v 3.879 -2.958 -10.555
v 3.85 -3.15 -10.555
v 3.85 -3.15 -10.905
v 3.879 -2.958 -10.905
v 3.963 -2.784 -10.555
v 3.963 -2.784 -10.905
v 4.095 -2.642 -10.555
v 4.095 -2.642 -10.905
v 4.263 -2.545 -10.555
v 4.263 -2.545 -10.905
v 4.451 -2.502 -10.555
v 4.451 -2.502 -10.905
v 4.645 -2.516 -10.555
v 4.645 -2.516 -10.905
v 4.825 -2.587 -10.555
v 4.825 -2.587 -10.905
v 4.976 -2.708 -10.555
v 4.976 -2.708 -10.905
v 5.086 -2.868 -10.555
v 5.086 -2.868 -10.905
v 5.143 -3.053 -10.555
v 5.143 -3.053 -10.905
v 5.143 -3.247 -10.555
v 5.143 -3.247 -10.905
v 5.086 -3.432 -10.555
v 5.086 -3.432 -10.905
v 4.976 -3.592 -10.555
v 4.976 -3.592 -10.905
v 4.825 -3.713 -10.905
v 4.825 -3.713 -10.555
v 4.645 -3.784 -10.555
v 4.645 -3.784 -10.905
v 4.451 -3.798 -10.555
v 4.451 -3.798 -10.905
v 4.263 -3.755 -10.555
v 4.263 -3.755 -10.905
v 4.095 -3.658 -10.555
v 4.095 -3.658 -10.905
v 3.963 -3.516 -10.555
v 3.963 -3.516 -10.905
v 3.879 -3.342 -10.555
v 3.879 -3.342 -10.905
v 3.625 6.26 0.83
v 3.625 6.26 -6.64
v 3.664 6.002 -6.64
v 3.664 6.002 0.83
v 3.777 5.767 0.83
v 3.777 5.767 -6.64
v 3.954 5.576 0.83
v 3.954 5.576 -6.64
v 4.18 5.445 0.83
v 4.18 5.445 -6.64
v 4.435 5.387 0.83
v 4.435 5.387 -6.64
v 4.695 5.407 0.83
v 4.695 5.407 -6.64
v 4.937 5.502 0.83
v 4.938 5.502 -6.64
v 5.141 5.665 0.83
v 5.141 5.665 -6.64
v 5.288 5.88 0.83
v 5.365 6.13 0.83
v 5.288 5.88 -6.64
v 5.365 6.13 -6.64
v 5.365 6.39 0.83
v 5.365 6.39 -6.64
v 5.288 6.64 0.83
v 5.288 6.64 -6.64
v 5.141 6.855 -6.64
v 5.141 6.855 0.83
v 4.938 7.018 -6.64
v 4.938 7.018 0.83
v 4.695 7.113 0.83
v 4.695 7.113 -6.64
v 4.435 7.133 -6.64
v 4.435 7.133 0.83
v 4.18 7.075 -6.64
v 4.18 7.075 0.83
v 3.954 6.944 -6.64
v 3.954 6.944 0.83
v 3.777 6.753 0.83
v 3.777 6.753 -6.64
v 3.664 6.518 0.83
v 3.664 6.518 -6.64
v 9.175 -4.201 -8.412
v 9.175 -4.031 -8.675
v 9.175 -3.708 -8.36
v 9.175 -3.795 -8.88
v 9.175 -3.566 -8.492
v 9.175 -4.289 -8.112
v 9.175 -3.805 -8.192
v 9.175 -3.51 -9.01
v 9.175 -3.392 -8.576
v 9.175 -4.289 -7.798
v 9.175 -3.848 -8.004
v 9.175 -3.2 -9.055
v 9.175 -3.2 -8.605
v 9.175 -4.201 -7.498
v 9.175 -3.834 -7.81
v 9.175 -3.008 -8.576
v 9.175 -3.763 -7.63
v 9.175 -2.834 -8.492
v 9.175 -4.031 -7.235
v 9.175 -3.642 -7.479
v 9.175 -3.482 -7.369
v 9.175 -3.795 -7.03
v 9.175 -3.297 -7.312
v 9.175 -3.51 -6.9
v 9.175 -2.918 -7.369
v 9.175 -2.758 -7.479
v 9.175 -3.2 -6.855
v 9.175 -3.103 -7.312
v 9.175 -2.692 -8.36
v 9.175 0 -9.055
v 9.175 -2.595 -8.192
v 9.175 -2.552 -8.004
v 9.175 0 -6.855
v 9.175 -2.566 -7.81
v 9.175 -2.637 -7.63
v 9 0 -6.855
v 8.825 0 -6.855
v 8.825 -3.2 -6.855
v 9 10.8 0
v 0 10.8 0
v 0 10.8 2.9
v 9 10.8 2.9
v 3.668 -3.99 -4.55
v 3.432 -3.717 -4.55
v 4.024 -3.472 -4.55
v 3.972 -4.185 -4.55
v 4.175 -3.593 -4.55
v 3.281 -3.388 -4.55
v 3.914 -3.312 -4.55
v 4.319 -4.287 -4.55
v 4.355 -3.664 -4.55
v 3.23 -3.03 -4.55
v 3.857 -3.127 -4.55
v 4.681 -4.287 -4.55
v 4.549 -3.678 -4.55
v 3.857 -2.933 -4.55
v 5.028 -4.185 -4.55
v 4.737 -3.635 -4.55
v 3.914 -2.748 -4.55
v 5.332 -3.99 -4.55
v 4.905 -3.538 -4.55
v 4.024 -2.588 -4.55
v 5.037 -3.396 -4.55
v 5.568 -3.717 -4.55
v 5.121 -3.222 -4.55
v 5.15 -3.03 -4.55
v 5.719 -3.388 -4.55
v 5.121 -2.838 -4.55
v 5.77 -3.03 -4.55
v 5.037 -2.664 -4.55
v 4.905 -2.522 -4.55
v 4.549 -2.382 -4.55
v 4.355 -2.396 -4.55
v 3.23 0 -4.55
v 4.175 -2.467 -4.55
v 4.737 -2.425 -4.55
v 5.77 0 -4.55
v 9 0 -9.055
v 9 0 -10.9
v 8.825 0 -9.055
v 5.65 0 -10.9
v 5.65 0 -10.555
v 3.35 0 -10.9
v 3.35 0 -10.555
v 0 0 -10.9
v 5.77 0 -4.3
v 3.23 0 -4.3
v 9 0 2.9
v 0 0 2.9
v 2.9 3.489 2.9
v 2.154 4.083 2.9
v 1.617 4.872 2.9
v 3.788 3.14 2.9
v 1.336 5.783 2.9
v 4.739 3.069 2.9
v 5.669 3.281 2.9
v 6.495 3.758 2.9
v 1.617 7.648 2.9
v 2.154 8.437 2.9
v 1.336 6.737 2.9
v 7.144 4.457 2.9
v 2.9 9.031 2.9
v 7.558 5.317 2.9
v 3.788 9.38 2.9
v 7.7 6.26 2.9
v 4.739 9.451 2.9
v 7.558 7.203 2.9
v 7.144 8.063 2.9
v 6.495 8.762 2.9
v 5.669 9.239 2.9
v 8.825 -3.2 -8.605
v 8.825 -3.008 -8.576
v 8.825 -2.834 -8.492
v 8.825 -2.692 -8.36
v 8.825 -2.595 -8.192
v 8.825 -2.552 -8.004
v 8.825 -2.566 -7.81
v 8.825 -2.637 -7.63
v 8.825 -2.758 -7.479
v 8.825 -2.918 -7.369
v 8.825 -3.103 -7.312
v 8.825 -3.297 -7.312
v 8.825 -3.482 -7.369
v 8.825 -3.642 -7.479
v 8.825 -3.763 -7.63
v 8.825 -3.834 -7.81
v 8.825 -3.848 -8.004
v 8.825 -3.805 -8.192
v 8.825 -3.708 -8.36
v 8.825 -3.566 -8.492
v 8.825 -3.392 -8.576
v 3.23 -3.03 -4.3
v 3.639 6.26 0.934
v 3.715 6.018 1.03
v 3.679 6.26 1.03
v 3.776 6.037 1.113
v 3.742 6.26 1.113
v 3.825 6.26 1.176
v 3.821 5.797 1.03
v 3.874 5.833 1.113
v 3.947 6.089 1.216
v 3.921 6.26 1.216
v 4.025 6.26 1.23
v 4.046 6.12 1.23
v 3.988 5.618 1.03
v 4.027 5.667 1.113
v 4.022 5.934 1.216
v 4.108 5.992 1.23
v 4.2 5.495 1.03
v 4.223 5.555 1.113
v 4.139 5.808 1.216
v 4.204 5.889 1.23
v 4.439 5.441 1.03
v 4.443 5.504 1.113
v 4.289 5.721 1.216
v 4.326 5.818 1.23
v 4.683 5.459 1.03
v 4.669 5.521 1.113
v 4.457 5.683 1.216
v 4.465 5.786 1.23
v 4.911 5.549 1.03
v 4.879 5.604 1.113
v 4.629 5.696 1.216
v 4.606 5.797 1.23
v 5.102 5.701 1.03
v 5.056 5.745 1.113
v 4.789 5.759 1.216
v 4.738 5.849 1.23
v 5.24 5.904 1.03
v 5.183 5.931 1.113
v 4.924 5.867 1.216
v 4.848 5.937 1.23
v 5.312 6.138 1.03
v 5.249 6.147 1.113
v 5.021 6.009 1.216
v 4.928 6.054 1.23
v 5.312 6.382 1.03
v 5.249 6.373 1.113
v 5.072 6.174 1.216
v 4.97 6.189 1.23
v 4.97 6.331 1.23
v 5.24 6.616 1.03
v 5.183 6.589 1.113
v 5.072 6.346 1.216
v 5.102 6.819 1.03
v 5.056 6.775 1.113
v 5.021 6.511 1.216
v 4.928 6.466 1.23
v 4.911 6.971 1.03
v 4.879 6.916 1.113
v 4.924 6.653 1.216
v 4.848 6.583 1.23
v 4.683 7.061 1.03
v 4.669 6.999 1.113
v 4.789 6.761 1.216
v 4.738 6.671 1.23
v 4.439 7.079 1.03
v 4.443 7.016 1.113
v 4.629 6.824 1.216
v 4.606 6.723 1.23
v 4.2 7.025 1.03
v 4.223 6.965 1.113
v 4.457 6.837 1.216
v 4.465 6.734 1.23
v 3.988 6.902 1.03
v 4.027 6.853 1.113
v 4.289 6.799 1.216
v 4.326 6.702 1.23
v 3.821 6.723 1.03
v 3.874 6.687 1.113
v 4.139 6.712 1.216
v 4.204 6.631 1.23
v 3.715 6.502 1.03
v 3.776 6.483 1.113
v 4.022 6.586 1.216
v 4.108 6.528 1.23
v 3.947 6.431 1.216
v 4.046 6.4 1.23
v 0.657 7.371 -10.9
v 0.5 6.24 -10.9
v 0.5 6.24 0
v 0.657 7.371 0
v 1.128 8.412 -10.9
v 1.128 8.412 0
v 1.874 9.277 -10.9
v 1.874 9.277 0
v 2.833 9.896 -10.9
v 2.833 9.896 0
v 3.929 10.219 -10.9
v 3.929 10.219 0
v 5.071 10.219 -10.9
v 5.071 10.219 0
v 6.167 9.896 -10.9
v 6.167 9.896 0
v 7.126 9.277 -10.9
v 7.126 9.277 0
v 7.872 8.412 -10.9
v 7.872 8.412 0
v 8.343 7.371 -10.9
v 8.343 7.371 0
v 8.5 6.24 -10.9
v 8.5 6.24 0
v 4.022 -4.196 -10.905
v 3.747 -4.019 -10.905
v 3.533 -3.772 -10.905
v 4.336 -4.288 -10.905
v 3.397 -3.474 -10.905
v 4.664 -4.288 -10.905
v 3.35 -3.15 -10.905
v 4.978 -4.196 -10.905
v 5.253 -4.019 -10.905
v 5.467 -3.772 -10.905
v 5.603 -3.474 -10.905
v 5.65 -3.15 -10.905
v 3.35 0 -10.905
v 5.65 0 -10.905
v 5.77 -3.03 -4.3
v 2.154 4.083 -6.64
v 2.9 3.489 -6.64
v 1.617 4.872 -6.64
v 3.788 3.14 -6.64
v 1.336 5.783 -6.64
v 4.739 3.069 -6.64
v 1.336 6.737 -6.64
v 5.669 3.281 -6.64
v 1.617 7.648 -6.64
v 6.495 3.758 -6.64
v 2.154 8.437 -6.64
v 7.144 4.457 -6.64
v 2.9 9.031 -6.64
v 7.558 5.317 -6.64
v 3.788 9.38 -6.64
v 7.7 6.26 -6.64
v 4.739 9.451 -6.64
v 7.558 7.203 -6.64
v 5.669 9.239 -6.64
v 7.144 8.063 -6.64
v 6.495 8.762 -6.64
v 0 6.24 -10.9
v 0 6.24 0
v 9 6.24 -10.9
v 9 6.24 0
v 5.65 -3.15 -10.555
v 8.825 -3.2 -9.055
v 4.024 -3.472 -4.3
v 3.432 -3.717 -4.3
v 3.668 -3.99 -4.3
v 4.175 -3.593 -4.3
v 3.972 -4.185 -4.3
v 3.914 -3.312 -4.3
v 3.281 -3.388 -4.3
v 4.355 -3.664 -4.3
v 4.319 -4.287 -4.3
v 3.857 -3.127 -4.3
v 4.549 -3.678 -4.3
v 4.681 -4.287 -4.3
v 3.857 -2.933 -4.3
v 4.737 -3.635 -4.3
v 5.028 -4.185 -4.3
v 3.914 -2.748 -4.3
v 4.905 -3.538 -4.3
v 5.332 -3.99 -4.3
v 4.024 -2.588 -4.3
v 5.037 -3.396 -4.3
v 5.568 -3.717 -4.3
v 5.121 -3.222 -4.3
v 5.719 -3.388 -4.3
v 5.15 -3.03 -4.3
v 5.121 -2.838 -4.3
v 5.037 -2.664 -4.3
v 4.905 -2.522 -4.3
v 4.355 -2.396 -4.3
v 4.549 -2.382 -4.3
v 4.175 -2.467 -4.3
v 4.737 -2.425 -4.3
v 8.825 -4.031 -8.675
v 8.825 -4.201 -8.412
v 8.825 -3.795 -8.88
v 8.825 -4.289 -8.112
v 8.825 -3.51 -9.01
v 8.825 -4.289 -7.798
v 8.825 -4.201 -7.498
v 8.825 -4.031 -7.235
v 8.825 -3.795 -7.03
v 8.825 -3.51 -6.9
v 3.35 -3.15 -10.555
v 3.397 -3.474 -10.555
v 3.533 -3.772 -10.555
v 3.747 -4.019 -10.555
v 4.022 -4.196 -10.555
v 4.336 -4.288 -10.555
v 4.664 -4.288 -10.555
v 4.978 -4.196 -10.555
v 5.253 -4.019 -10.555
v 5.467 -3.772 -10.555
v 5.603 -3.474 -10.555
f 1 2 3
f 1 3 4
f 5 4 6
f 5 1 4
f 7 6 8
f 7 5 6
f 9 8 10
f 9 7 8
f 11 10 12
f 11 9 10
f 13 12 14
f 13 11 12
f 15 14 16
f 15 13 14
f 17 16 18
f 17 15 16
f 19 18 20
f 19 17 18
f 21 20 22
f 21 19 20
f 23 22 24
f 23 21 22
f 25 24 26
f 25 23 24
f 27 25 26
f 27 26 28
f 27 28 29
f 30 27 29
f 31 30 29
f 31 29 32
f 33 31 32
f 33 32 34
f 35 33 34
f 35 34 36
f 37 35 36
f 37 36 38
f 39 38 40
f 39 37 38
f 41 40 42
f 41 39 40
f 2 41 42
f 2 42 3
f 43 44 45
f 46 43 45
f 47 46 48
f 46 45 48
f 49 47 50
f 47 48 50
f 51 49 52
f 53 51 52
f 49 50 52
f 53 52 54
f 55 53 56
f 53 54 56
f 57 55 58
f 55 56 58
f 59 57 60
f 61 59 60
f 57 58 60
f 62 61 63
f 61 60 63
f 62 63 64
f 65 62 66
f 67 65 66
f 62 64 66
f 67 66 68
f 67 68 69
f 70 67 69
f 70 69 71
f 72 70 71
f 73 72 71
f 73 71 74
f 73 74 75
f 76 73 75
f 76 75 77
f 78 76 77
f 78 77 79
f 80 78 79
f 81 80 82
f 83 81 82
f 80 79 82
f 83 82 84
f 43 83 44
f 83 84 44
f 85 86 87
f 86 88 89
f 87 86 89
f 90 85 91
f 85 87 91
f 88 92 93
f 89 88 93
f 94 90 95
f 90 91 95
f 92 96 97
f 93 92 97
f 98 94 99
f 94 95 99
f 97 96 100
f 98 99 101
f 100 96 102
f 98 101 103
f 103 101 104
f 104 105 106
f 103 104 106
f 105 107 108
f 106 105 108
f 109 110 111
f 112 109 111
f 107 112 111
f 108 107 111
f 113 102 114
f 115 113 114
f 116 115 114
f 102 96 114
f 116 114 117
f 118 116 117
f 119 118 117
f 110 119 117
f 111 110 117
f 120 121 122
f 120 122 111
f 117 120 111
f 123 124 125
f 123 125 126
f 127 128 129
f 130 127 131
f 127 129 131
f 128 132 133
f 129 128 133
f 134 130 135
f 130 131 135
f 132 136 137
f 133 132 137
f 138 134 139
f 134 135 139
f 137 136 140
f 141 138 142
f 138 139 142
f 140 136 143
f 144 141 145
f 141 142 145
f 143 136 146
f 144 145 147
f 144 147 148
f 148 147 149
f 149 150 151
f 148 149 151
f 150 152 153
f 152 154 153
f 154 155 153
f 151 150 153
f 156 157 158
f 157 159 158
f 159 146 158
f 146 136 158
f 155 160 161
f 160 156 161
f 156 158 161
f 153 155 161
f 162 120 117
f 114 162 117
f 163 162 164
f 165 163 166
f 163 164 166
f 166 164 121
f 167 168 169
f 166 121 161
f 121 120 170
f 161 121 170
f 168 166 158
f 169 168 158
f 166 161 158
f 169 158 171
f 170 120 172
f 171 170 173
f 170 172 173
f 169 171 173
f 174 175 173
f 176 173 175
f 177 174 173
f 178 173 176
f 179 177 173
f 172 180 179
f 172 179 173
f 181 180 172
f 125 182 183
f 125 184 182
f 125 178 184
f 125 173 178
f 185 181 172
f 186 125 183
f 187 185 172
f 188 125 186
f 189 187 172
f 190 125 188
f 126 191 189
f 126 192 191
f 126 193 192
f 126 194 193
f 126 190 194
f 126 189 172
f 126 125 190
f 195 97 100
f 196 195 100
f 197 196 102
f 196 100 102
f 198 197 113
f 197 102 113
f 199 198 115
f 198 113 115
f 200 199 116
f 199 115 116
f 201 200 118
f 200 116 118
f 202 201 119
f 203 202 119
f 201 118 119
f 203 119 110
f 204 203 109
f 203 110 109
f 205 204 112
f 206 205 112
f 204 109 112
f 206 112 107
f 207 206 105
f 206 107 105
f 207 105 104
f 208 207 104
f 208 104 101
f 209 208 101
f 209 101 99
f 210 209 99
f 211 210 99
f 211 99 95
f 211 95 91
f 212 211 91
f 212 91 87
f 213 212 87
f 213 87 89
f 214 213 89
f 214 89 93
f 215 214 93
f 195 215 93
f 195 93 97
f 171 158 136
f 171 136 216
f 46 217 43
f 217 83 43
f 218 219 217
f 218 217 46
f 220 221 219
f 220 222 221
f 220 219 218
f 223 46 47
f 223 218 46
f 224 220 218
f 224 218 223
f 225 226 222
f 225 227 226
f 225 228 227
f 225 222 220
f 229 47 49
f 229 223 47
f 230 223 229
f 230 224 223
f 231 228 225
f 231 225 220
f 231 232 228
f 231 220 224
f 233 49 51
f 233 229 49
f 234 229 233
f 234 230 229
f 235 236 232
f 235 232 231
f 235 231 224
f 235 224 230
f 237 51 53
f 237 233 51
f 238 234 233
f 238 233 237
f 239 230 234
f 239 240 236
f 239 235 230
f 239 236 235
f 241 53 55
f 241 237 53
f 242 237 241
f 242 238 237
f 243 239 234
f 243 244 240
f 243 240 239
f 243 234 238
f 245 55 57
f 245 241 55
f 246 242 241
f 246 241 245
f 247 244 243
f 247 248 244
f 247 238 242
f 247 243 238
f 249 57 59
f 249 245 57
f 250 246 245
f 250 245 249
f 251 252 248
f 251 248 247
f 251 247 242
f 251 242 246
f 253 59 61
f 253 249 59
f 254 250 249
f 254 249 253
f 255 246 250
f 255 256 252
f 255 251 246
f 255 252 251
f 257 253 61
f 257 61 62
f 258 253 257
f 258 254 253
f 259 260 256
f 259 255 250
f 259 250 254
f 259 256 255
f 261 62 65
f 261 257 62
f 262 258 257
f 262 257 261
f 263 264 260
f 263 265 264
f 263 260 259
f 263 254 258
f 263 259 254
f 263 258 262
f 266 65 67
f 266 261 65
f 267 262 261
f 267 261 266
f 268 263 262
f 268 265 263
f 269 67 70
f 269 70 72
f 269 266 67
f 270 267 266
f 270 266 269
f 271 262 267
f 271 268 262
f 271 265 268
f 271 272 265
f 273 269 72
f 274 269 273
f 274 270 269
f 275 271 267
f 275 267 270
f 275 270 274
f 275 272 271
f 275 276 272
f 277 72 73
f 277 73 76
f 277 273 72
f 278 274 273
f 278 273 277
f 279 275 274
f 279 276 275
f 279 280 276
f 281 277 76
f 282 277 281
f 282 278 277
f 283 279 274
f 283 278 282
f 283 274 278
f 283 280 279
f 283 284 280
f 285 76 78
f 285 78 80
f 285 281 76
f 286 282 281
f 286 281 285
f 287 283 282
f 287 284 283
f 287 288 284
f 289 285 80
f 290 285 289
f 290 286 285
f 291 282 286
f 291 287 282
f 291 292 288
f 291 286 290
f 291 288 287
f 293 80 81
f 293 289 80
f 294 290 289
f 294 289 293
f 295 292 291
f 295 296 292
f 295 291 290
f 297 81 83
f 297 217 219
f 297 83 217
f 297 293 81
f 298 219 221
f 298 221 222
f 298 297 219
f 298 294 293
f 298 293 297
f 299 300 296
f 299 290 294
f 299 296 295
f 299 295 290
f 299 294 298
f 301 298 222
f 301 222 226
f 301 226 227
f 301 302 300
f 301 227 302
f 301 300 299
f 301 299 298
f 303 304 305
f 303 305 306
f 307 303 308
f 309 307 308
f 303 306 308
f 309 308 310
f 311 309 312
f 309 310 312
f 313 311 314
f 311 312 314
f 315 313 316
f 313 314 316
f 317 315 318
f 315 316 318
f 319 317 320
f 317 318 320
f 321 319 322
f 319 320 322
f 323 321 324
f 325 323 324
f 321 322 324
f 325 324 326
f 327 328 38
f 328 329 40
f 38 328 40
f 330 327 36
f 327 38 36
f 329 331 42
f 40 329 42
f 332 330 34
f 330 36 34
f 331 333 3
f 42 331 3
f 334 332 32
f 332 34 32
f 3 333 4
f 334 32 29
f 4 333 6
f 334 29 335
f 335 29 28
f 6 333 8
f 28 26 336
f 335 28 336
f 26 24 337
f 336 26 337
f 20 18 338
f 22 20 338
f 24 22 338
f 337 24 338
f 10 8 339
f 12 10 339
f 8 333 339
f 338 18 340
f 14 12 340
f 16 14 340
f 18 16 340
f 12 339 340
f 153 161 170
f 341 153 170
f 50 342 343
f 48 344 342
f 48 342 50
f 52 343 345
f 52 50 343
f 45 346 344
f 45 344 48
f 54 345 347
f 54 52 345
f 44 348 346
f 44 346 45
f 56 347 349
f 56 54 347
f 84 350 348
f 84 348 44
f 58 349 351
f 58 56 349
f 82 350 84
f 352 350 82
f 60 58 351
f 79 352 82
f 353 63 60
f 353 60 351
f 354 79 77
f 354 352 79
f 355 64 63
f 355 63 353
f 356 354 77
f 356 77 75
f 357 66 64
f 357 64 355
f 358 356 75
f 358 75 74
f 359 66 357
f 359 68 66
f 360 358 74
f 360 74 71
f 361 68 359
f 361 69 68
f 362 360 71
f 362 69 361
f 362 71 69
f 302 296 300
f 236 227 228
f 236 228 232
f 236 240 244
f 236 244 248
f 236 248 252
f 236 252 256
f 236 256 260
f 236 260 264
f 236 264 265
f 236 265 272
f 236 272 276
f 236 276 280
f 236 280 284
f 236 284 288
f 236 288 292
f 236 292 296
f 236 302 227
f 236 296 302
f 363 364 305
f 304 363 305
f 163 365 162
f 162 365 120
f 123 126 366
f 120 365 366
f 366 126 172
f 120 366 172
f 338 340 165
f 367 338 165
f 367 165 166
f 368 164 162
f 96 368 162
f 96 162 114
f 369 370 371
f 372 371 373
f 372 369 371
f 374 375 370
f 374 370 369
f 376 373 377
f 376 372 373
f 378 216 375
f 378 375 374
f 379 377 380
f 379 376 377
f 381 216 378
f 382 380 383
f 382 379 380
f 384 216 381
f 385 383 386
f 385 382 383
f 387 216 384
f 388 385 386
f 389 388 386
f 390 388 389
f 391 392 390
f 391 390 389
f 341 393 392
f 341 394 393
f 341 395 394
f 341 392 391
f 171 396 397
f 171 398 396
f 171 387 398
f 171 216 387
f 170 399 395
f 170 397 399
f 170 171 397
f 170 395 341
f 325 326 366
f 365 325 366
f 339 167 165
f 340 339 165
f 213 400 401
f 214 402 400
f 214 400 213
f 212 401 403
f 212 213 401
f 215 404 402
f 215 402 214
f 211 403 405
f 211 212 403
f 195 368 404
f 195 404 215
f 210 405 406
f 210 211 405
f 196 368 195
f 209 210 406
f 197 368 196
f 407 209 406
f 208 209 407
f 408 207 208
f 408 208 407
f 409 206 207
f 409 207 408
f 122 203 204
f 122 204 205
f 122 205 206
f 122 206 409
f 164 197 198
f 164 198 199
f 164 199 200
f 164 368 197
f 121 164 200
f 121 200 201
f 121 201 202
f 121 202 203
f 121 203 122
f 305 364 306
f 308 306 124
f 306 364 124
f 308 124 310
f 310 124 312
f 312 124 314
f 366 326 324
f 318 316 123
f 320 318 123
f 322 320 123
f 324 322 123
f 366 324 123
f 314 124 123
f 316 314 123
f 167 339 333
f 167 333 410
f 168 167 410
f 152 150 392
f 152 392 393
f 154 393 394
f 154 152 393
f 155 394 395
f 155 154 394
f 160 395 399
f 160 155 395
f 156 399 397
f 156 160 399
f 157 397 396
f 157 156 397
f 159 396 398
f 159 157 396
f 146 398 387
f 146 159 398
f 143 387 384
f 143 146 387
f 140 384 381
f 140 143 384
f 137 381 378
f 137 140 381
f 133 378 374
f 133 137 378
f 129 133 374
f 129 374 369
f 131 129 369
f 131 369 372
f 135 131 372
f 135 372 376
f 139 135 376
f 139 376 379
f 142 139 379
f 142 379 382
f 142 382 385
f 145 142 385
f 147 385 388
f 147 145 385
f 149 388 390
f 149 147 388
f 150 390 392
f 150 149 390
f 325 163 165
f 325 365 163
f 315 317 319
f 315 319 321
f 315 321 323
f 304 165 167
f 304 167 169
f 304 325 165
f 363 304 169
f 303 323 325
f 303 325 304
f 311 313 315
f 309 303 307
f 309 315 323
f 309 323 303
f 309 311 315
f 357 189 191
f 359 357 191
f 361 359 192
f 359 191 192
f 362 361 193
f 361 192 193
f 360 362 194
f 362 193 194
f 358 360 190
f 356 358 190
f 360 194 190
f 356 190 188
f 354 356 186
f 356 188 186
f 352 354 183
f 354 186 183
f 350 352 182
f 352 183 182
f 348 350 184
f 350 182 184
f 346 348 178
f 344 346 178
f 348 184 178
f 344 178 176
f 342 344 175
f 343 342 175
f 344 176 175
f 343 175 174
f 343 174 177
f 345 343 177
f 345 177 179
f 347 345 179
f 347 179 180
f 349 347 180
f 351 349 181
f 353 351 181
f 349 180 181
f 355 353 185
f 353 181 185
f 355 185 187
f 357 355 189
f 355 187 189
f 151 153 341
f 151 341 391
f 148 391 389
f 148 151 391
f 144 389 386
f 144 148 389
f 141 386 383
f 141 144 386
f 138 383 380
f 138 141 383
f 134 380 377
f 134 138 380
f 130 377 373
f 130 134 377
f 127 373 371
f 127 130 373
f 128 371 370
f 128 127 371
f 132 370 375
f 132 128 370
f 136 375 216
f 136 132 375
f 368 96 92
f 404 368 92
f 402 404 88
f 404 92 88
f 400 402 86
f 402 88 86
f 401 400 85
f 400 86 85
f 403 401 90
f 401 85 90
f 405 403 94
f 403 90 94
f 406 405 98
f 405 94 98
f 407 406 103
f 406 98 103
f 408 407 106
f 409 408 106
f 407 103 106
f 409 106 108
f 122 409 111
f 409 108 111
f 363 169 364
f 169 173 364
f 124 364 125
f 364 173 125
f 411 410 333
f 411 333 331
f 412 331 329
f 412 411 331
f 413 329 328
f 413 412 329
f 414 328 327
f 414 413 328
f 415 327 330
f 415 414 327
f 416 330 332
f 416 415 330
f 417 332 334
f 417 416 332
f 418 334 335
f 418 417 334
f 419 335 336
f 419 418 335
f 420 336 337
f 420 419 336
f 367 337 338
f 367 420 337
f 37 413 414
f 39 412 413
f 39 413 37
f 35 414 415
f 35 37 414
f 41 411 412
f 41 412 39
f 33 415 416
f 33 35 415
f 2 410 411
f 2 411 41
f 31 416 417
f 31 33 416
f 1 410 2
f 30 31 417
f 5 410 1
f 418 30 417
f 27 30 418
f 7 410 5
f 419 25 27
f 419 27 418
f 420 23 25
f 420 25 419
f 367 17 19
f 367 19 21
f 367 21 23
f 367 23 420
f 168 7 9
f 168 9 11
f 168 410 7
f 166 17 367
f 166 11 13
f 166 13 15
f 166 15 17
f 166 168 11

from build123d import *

# Parameters (mm, degrees)
SKETCH1_W           = 9
SKETCH1_H           = 10.8
BOSS_EXTRUDE1_DEPTH = 2.9
BOSS_EXTRUDE2_DEPTH = 10.9
SKETCH3_R           = 3.2
CUT_EXTRUDE1_DEPTH  = 9.54
SKETCH4_R           = 0.875
BOSS_EXTRUDE3_DEPTH = 7.87
FILLET1_R           = 0.4
SKETCH5_W           = 2.54
SKETCH5_H           = 0.25
SKETCH5_W_2         = 2.3
SKETCH5_H_2         = 0.35
SKETCH5_W_3         = 0.35
SKETCH5_H_3         = 2.2
BOSS_EXTRUDE4_DEPTH = 4.3
CUT_EXTRUDE2_START  = -0.25
SKETCH6_R           = 0.65
CUT_EXTRUDE2_DEPTH  = 0.25
SKETCH7_R           = 0.65
CUT_EXTRUDE3_DEPTH  = 18.881265336
CUT_EXTRUDE5_START  = -0.35
SKETCH9_R           = 0.65
CUT_EXTRUDE5_DEPTH  = 0.35


with BuildPart() as part:
    # Sketch1 → Boss-Extrude1 (new body)
    with BuildSketch(Plane.XY):
        with Locations((4.5, 5.4)):
            Rectangle(SKETCH1_W, SKETCH1_H)
    extrude(amount=BOSS_EXTRUDE1_DEPTH)

    # Sketch2 → Boss-Extrude2 (add)
    with BuildSketch(Plane(origin=(0, 0, 0), x_dir=(-1, 0, 0), z_dir=(0, 0, -1))):
        with BuildLine():
            Line((-9, 0), (0, 0))
            Line((0, 0), (0, 6.24))
            Line((0, 6.24), (-0.50005, 6.24))
            ThreePointArc((-0.50005, 6.24), (-4.5, 10.26), (-8.49995, 6.24))
            Line((-8.49995, 6.24), (-9, 6.24))
            Line((-9, 6.24), (-9, 0))
        make_face()
    extrude(amount=BOSS_EXTRUDE2_DEPTH)

    # Sketch3 → Cut-Extrude1 (cut)
    with BuildSketch(Plane.XY.offset(2.9)):
        with Locations((4.5, 6.26)):
            Circle(SKETCH3_R)
    extrude(amount=-CUT_EXTRUDE1_DEPTH, mode=Mode.SUBTRACT)

    # Sketch4 → Boss-Extrude3 (add)
    with BuildSketch(Plane.XY.offset(-6.64)):
        with Locations(Location((4.5, 6.26, 0), (0, 0, 180))):
            Circle(SKETCH4_R)
    extrude(amount=BOSS_EXTRUDE3_DEPTH)

    # Fillet1
    fillet1_edges = [part.edges().sort_by_distance(p)[0] for p in [
        (5.375, 6.26, 1.23),
    ]]
    fillet(fillet1_edges, radius=FILLET1_R)

    # Sketch5 → Boss-Extrude4 (add)
    with BuildSketch(Plane.XZ):
        with Locations((4.5, -4.425)):
            Rectangle(SKETCH5_W, SKETCH5_H)
        with Locations((4.5, -10.73)):
            Rectangle(SKETCH5_W_2, SKETCH5_H_2)
        with Locations((9, -7.955)):
            Rectangle(SKETCH5_W_3, SKETCH5_H_3)
    extrude(amount=BOSS_EXTRUDE4_DEPTH)

    # Sketch6 → Cut-Extrude2 (cut)
    with BuildSketch(Plane.XY.offset(-4.3).offset(CUT_EXTRUDE2_START)):
        with Locations((4.5, -3.03)):
            Circle(SKETCH6_R)
        with BuildLine():
            Line((3.23, -3.03), (2.98145415, -3.03))
            Line((2.98145415, -3.03), (2.98145415, -4.481636856))
            Line((2.98145415, -4.481636856), (5.931605951, -4.481636856))
            Line((5.931605951, -4.481636856), (5.931605951, -3.03))
            Line((5.931605951, -3.03), (5.77, -3.03))
            ThreePointArc((5.77, -3.03), (4.5, -4.3), (3.23, -3.03))
        make_face()
    extrude(amount=CUT_EXTRUDE2_DEPTH, mode=Mode.SUBTRACT)

    # Sketch7 → Cut-Extrude3 (cut, through all)
    with BuildSketch(Plane(origin=(9.175, 0, 0), x_dir=(0, 0, -1), z_dir=(1, 0, 0))):
        with Locations((7.955, -3.2)):
            Circle(SKETCH7_R)
        with BuildLine():
            Line((6.855, -3.2), (6.537099377, -3.2))
            Line((6.537099377, -3.2), (6.537099377, -4.556833282))
            Line((6.537099377, -4.556833282), (9.415825045, -4.556833282))
            Line((9.415825045, -4.556833282), (9.415825045, -3.2))
            Line((9.415825045, -3.2), (9.055, -3.2))
            ThreePointArc((9.055, -3.2), (7.955, -4.3), (6.855, -3.2))
        make_face()
    extrude(amount=-CUT_EXTRUDE3_DEPTH, mode=Mode.SUBTRACT)

    # Sketch9 → Cut-Extrude5 (cut)
    with BuildSketch(Plane(origin=(0, 0, -10.905), x_dir=(-1, 0, 0), z_dir=(0, 0, -1)).offset(CUT_EXTRUDE5_START)):
        with Locations((-4.5, -3.15)):
            Circle(SKETCH9_R)
        with BuildLine():
            Line((-5.65, -3.15), (-6.063372646, -3.15))
            Line((-6.063372646, -3.15), (-6.063372646, -4.563001678))
            Line((-6.063372646, -4.563001678), (-3.002045836, -4.563001678))
            Line((-3.002045836, -4.563001678), (-3.002045836, -3.15))
            Line((-3.002045836, -3.15), (-3.35, -3.15))
            ThreePointArc((-3.35, -3.15), (-4.5, -4.3), (-5.65, -3.15))
        make_face()
    extrude(amount=CUT_EXTRUDE5_DEPTH, mode=Mode.SUBTRACT)


solid = part.part
